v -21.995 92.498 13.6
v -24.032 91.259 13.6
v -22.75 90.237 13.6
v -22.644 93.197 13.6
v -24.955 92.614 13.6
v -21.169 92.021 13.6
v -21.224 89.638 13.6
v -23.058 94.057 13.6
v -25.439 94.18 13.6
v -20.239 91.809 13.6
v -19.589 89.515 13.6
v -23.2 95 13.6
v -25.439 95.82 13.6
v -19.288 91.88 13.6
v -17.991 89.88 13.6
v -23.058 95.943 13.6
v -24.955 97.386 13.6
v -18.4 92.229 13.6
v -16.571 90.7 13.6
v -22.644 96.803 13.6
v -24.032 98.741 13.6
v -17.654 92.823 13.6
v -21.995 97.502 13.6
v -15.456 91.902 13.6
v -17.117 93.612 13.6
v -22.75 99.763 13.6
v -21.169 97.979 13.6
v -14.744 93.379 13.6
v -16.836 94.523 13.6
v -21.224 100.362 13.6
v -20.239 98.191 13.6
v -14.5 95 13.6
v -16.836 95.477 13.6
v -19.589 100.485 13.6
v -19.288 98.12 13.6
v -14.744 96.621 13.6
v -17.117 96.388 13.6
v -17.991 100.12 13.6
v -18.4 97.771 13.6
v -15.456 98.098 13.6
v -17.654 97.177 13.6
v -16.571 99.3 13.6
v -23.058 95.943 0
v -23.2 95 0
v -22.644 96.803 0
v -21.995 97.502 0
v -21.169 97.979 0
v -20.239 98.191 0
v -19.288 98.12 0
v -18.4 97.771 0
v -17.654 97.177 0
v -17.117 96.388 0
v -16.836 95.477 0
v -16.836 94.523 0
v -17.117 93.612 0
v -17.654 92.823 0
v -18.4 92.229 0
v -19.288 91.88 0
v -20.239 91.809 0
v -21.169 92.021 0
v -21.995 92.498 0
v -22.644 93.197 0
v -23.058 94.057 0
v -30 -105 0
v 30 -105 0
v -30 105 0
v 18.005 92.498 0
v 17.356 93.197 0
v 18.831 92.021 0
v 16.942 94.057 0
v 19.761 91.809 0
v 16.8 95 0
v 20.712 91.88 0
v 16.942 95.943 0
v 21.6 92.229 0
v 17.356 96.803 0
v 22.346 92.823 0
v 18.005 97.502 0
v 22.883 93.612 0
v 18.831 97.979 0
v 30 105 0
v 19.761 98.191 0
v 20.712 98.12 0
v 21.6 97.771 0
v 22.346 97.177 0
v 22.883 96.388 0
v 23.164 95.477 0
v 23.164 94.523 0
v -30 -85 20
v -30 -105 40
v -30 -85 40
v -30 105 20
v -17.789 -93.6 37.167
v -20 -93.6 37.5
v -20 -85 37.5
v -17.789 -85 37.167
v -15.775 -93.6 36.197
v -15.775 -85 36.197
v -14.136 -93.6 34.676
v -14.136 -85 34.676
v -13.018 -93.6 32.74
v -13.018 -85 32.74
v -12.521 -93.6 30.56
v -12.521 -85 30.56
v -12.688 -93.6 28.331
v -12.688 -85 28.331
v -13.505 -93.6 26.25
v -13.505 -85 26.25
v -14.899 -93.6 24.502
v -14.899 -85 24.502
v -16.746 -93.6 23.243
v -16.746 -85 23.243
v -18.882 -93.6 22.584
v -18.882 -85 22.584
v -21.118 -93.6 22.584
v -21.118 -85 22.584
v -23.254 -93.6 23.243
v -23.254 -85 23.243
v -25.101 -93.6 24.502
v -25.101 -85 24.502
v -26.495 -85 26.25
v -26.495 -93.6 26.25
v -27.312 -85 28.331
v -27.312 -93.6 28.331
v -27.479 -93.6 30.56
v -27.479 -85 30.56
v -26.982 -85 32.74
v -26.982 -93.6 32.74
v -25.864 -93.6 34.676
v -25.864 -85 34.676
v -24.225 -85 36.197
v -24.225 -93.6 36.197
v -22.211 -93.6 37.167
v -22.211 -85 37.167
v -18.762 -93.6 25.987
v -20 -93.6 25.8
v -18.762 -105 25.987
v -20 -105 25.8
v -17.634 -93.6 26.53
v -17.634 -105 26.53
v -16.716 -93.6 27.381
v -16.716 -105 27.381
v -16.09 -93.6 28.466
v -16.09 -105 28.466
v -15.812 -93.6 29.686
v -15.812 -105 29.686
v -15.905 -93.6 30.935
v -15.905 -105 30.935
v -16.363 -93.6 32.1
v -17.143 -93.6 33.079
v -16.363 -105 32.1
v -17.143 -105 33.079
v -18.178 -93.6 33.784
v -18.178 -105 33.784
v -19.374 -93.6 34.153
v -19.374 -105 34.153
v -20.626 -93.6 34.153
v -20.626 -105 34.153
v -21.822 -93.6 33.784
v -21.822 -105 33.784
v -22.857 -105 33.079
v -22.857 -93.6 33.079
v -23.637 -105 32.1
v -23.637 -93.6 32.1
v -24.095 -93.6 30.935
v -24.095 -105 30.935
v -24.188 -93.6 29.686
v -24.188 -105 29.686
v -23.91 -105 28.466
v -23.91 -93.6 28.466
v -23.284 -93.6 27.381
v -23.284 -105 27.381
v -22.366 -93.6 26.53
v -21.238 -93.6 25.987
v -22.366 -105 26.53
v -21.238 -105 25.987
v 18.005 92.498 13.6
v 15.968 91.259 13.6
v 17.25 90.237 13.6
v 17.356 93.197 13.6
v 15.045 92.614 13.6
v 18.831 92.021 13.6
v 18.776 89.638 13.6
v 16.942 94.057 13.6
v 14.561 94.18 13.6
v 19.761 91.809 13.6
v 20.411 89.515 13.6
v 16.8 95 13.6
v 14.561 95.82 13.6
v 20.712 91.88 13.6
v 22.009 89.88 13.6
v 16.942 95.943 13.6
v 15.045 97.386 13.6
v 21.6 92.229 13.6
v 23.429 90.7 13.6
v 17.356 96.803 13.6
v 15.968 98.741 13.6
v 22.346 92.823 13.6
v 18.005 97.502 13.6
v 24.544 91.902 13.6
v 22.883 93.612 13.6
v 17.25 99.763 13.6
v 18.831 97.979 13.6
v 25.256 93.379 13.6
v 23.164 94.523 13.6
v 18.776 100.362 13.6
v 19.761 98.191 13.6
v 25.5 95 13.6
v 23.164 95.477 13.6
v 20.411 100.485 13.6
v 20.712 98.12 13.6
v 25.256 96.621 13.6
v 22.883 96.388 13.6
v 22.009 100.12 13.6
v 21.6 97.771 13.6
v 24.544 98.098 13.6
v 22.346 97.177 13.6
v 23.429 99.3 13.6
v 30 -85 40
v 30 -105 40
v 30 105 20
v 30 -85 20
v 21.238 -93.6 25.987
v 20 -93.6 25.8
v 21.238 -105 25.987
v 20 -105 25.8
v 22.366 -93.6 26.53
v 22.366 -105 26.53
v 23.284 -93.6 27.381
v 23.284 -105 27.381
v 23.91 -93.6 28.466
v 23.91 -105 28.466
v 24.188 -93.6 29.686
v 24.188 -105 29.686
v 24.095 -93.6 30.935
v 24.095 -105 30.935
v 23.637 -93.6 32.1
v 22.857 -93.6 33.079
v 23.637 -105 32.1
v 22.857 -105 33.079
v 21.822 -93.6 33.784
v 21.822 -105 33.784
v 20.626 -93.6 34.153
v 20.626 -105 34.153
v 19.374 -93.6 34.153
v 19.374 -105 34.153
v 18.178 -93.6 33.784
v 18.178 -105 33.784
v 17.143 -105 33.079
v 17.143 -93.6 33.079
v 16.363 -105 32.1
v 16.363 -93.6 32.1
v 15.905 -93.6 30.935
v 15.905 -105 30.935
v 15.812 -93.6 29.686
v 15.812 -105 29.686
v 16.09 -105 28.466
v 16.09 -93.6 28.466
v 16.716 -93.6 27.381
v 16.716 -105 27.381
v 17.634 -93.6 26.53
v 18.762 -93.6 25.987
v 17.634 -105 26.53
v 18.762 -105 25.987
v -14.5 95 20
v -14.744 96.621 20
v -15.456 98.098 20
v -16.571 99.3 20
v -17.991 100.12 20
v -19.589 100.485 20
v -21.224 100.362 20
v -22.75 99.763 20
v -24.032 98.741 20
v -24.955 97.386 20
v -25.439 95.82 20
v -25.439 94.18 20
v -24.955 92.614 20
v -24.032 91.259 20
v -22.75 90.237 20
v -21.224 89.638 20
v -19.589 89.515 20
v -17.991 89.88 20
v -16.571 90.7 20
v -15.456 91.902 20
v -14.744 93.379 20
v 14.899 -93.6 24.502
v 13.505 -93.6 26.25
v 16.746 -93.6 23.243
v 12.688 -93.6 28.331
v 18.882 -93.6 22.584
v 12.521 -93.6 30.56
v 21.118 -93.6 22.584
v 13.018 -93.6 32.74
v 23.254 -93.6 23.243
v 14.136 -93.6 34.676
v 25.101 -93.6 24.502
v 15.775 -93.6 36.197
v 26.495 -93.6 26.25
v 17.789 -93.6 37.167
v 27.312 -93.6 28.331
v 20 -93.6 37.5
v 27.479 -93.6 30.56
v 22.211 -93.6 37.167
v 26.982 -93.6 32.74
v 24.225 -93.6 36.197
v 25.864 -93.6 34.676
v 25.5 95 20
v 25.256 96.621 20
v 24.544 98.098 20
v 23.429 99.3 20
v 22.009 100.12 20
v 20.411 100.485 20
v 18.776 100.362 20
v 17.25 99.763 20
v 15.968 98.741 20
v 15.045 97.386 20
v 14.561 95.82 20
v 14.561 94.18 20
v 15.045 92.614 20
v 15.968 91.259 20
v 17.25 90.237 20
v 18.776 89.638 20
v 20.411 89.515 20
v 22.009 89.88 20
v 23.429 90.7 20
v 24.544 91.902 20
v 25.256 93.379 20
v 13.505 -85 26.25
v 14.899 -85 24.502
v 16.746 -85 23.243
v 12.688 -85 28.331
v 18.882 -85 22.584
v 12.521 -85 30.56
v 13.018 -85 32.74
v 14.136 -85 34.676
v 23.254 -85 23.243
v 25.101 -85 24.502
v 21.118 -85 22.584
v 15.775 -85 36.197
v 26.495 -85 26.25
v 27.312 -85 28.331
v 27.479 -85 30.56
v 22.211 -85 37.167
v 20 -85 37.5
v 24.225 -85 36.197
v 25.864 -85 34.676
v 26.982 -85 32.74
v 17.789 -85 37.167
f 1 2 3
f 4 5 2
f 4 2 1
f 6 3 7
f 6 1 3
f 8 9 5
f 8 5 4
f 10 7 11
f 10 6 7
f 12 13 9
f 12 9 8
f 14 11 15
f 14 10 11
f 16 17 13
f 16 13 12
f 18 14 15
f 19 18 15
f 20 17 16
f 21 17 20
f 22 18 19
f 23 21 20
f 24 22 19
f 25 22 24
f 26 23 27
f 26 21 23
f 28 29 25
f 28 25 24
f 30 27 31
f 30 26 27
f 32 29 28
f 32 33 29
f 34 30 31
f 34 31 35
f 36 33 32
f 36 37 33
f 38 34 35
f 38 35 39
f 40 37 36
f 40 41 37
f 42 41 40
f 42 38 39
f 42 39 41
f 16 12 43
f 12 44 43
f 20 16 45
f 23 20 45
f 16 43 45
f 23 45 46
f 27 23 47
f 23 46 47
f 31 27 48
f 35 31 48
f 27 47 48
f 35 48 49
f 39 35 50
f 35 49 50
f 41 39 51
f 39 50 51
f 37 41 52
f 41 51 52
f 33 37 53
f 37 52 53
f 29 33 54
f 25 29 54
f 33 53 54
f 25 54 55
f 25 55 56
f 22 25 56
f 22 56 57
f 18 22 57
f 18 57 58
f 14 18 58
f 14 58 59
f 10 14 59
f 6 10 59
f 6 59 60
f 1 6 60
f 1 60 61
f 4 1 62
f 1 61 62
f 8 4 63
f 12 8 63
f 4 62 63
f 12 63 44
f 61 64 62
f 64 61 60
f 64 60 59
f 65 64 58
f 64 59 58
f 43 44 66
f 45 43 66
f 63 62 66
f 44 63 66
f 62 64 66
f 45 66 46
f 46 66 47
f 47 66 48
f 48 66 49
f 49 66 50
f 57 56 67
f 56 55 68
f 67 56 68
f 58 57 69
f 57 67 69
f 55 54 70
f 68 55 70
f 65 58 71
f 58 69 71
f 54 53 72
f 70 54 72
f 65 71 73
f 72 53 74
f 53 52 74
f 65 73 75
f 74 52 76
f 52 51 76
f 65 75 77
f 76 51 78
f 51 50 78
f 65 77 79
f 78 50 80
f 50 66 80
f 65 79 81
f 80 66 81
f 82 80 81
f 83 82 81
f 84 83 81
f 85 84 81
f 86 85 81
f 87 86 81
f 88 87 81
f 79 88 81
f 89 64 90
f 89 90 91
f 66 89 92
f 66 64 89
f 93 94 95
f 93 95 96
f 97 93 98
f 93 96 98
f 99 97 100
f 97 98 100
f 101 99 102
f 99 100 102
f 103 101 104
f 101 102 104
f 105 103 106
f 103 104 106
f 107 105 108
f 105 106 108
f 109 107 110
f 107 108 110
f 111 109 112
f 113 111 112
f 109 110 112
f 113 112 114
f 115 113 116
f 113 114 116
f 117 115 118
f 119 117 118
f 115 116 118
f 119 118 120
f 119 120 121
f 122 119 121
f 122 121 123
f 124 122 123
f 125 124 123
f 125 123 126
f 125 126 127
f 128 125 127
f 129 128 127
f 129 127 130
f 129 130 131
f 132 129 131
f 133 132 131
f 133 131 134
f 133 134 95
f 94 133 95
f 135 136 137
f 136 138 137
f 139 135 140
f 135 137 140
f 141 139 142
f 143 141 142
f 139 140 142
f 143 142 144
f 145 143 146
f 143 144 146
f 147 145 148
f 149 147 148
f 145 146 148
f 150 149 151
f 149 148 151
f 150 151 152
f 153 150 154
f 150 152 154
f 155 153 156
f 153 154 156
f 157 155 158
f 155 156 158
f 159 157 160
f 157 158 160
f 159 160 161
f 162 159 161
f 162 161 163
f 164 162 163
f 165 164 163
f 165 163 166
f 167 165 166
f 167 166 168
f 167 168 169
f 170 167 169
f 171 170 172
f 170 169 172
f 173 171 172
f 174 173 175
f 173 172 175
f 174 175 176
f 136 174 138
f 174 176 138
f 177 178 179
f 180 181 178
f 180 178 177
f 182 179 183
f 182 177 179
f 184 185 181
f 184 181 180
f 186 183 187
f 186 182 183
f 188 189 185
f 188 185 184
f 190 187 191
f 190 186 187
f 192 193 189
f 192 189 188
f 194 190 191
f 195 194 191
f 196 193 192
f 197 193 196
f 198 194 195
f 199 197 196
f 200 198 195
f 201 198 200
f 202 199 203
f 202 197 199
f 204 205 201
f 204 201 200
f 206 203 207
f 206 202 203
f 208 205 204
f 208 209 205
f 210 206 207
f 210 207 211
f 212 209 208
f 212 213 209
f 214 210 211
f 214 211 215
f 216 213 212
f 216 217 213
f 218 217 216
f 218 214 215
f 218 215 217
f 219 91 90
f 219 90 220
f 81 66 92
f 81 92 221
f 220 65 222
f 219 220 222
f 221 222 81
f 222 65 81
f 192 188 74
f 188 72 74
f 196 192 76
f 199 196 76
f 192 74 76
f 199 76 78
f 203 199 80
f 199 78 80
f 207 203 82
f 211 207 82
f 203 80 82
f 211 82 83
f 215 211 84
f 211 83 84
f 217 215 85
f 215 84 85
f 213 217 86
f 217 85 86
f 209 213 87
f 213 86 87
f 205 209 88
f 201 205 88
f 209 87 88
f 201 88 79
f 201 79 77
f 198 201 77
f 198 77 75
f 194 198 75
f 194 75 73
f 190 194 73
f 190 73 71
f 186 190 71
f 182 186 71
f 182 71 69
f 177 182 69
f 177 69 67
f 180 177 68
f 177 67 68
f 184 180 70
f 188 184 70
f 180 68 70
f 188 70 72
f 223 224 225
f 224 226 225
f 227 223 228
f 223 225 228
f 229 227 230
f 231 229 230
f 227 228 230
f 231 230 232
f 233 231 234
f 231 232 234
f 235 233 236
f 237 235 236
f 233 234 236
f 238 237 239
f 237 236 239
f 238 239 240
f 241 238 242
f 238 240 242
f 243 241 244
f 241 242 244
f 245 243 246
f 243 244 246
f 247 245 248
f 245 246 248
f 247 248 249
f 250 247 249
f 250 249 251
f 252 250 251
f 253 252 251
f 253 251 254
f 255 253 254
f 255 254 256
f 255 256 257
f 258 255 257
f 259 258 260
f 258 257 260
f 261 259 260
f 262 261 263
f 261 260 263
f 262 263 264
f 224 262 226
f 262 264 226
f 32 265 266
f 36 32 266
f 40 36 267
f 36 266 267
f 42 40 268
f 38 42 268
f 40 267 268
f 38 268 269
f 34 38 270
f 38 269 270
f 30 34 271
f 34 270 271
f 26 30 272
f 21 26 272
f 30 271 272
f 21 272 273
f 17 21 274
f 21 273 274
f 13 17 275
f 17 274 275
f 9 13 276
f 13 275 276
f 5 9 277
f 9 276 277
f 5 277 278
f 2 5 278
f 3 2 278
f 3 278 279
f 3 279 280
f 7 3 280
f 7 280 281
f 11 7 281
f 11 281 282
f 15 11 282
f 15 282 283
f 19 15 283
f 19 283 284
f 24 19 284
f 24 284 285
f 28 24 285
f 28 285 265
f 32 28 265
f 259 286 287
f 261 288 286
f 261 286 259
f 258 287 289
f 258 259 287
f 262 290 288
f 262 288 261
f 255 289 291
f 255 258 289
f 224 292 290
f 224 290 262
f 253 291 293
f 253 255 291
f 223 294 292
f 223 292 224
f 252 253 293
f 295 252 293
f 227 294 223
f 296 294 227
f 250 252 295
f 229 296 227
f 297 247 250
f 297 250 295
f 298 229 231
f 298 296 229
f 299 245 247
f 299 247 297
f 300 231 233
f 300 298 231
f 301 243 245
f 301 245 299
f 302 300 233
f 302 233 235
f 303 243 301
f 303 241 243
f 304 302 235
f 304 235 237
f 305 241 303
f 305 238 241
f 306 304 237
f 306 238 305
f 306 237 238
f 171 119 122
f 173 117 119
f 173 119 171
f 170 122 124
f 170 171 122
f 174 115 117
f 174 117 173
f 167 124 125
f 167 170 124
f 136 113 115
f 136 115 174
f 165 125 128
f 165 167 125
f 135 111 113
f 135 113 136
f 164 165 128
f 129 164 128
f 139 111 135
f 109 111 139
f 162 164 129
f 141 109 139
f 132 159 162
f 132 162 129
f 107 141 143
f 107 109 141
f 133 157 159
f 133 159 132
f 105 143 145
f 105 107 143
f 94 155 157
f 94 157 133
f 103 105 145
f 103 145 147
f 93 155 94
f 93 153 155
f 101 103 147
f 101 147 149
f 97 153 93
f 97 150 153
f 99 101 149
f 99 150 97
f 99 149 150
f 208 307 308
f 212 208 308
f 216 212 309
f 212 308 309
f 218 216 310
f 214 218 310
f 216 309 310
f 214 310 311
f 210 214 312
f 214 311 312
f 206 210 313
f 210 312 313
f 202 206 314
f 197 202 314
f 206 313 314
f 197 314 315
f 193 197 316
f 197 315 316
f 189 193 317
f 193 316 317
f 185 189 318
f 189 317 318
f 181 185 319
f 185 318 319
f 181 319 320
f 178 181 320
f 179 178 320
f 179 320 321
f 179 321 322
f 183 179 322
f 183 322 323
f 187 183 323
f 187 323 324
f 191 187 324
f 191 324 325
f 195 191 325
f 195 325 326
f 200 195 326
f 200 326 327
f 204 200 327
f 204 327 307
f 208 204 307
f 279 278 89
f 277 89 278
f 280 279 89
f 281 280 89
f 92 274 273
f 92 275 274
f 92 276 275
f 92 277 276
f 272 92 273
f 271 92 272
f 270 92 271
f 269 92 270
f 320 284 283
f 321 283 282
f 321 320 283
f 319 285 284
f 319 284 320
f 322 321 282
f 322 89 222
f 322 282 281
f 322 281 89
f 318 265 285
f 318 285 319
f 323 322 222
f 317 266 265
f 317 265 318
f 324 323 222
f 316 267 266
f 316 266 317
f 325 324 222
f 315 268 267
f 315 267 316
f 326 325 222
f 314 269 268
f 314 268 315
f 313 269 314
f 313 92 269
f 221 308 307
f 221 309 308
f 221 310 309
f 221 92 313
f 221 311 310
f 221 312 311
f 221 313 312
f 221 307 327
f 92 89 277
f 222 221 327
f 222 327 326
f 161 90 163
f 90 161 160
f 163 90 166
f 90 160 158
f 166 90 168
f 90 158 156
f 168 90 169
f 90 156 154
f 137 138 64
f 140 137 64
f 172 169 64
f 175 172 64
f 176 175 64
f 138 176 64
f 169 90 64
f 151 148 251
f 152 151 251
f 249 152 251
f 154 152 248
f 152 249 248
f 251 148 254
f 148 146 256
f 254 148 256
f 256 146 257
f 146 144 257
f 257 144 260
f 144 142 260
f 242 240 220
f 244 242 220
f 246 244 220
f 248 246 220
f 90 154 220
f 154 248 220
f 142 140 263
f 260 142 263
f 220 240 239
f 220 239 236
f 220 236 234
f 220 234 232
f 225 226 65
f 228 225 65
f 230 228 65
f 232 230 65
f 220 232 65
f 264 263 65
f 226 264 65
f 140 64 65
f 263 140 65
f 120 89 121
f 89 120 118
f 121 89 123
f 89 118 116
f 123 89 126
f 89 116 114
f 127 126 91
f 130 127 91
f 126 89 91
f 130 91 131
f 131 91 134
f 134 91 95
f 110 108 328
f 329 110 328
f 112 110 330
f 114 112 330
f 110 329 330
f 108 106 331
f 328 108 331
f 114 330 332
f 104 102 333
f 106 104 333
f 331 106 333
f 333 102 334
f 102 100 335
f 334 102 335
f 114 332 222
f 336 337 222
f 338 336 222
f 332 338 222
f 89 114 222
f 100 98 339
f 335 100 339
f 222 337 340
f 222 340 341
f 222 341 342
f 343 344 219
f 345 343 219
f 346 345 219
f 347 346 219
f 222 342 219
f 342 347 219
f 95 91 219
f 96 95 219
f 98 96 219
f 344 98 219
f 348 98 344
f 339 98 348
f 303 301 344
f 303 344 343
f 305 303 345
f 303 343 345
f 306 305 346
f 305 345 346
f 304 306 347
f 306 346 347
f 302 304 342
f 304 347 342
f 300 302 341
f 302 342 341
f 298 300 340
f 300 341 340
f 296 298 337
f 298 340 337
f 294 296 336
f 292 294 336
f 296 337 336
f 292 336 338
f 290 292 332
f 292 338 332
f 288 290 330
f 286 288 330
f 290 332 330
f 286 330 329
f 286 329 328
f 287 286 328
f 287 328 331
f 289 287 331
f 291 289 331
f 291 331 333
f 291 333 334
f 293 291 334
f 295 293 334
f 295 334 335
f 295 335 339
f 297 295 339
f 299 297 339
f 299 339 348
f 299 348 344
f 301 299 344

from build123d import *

# Parameters (mm, degrees)
SKETCH_2_W                   = 60
SKETCH_2_H                   = 210
EXTRUDE_1_DEPTH              = 40
SKETCH_3_W                   = 60
SKETCH_3_H                   = 190
CUT_EXTRUDE_1_DEPTH          = 20
HOLE_WIZARD_M6_2_D           = 6.4
HOLE_WIZARD_M6_2_CBORE_D     = 11
HOLE_WIZARD_M6_2_CBORE_DEPTH = 6.4
HOLE_WIZARD_M8_2_D           = 8.4
HOLE_WIZARD_M8_2_CBORE_D     = 15
HOLE_WIZARD_M8_2_CBORE_DEPTH = 8.6


with BuildPart() as part:
    # 草图2 → 凸台-拉伸1 (new body)
    with BuildSketch(Plane.XY):
        Rectangle(SKETCH_2_W, SKETCH_2_H)
    extrude(amount=EXTRUDE_1_DEPTH)

    # 草图3 → 切除-拉伸1 (cut)
    with BuildSketch(Plane.XY.offset(40)):
        with Locations((0, 10)):
            Rectangle(SKETCH_3_W, SKETCH_3_H)
    extrude(amount=-CUT_EXTRUDE_1_DEPTH, mode=Mode.SUBTRACT)

    # M6 六角凹头螺钉的柱形沉头孔2 (through all)
    with Locations(Plane(origin=(-20, 95, 20), x_dir=(1, 0, 0), z_dir=(0, 0, 1))):
        with Locations((0, 0), (40, 0)):
            CounterBoreHole(HOLE_WIZARD_M6_2_D / 2, HOLE_WIZARD_M6_2_CBORE_D / 2, HOLE_WIZARD_M6_2_CBORE_DEPTH)

    # M8 六角凹头螺钉的柱形沉头孔2 (through all)
    with Locations(Plane(origin=(-20, -85, 30), x_dir=(0, 0, 1), z_dir=(0, 1, 0))):
        with Locations((0, 0), (0, 40)):
            CounterBoreHole(HOLE_WIZARD_M8_2_D / 2, HOLE_WIZARD_M8_2_CBORE_D / 2, HOLE_WIZARD_M8_2_CBORE_DEPTH)


solid = part.part
